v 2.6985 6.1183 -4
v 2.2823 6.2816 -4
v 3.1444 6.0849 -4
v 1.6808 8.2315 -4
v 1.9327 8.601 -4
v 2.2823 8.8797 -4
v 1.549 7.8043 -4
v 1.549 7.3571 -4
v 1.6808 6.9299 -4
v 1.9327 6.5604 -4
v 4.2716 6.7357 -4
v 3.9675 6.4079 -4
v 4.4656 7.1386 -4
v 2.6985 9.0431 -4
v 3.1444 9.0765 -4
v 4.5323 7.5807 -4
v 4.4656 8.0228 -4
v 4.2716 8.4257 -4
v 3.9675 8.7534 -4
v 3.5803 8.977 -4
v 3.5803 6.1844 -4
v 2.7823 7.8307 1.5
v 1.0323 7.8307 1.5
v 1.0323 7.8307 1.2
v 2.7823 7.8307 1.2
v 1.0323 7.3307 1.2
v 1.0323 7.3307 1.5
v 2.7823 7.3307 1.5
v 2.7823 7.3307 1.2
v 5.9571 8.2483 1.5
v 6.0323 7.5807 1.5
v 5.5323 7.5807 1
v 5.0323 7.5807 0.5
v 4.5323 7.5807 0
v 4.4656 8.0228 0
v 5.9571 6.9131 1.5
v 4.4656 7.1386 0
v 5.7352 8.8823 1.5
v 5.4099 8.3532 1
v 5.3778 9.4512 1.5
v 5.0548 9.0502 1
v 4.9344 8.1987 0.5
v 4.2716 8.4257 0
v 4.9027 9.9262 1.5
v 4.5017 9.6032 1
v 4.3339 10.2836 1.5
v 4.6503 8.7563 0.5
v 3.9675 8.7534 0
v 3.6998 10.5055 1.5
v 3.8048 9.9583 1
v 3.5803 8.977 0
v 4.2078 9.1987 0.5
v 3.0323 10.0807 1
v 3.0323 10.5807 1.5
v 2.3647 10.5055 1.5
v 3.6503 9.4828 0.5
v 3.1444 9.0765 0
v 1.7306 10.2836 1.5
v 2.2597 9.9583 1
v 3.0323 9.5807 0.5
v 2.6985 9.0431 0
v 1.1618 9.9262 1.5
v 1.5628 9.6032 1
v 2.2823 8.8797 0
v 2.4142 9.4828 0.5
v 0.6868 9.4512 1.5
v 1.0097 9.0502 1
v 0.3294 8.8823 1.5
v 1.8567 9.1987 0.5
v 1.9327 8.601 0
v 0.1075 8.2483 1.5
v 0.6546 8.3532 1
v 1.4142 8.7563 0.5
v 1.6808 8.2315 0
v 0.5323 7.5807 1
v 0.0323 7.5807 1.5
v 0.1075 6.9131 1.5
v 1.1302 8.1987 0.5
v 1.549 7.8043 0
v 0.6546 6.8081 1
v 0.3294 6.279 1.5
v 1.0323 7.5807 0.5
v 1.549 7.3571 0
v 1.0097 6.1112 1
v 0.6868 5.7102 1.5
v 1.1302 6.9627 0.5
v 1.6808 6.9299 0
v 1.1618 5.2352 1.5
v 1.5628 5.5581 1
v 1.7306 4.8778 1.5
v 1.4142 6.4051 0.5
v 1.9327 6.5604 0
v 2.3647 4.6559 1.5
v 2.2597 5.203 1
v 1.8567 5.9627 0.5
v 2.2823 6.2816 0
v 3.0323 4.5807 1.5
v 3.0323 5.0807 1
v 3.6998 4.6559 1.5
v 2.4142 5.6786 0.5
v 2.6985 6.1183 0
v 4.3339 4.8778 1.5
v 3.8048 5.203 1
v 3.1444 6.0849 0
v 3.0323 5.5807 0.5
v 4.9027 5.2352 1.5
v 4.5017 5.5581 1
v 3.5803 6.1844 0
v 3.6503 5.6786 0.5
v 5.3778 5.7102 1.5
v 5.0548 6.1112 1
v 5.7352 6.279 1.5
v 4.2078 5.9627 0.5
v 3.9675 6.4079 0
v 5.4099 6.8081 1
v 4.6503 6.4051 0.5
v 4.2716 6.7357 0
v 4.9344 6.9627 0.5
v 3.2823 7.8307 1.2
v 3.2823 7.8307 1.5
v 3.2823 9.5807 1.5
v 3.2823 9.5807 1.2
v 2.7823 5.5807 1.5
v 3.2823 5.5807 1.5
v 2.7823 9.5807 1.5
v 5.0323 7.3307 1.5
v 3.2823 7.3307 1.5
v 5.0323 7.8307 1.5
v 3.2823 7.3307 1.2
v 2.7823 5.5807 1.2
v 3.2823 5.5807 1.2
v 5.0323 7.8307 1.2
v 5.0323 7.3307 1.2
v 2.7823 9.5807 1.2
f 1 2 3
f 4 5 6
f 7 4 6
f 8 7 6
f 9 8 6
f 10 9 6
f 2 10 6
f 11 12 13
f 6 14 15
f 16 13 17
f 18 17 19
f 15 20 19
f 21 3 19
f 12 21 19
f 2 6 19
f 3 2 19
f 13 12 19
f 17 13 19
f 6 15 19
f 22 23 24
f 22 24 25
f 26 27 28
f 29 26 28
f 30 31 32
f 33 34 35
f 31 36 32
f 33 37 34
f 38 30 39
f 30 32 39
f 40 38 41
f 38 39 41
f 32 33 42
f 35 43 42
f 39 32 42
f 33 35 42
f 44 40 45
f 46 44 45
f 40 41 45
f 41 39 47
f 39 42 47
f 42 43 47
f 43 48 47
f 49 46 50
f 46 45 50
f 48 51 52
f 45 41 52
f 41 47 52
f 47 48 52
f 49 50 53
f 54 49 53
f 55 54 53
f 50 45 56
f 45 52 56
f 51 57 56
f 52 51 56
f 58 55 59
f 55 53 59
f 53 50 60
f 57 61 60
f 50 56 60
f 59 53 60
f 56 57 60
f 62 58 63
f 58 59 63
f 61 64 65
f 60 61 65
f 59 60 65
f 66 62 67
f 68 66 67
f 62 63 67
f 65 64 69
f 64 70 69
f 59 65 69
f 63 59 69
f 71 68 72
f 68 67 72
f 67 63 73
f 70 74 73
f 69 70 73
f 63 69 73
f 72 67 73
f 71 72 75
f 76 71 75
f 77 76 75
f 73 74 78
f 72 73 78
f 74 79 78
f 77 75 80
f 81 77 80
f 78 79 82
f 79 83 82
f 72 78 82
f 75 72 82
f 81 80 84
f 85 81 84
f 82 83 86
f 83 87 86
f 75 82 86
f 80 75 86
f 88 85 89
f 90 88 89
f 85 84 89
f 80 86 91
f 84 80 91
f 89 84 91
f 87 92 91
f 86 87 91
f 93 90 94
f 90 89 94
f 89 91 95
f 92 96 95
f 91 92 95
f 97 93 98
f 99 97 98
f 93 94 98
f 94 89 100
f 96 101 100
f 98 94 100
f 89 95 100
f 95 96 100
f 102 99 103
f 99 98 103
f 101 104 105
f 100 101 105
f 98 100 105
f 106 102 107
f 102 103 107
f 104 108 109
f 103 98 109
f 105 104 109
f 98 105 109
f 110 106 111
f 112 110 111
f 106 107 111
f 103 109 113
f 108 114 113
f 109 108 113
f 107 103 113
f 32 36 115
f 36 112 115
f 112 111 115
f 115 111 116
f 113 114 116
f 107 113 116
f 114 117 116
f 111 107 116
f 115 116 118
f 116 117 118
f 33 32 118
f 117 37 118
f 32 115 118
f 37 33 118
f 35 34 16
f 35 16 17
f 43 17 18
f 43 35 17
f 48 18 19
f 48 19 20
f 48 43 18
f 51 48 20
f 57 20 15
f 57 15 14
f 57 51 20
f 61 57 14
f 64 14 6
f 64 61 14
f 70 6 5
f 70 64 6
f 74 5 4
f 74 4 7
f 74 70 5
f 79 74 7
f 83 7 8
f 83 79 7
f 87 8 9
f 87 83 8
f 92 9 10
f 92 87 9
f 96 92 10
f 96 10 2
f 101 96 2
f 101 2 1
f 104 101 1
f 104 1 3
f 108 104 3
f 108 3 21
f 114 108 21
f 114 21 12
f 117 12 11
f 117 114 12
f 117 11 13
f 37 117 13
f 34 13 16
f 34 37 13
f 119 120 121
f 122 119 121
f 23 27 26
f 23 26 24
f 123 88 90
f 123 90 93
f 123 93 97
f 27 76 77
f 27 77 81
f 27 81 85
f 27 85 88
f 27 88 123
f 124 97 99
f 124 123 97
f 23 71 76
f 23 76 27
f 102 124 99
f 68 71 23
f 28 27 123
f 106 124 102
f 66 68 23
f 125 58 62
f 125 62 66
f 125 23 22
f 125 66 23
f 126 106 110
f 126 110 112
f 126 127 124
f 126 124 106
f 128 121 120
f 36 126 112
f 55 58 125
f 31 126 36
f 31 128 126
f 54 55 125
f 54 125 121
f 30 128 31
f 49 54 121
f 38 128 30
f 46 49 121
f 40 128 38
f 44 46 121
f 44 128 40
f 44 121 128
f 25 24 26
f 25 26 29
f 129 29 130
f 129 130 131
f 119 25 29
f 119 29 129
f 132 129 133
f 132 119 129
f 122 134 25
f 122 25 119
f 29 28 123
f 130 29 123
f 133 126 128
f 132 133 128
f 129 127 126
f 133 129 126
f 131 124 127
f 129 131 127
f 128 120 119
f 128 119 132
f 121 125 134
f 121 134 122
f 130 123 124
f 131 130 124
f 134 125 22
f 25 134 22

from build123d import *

# Parameters (mm, degrees)
F0_R     = 3
F1_DEPTH = 1.5
F2_SIZE  = 1.49999
F3_W     = 0.5
F3_H     = 1.75
F3_H_2   = 0.5
F3_W_2   = 1.75
F4_DEPTH = 0.3
F5_DEPTH = 4


# Not quite as in the source:
# - a fillet or chamfer is up to 0.001 mm smaller than in the source, because OpenCascade refuses the exact size


with BuildPart() as f1:
    # F0 (on Top) → F1 (new body)
    with BuildSketch(Plane.XY):
        with Locations((3.0322743114, 7.5806910172)):
            Circle(F0_R)
    extrude(amount=F1_DEPTH)

    # F2 (size 1.5 in the source; OpenCascade refuses exactly that, so slightly less here)
    f2_edges = [f1.edges().sort_by_distance(p)[0] for p in [
        (0.032274, 7.580691, 0),
    ]]
    chamfer(f2_edges, length=F2_SIZE)

    # F3 (on face) → F4 (cut)
    with BuildSketch(Plane.XY.offset(1.5)):
        with Locations((3.0322743114, 8.7056910172)):
            Rectangle(F3_W, F3_H)
        with Locations((3.0322743114, 7.5806910172)):
            Rectangle(F3_W, F3_H_2)
        with Locations((1.9072743114, 7.5806910172)):
            Rectangle(F3_W_2, F3_H_2)
        with Locations((4.1572743114, 7.5806910172)):
            Rectangle(F3_W_2, F3_H_2)
        Polygon((3.2822743114, 7.3306910172), (2.7822743114, 7.3306910172), (2.7822743114, 5.5806910172), (3.0322743114, 5.5806910172), (3.2822743114, 5.5806910172), align=None)
    extrude(amount=-F4_DEPTH, mode=Mode.SUBTRACT)

    # F5 (add): a face of the model
    f5_faces = [f1.faces().sort_by_distance(p)[0] for p in [
        (3.0322743114, 7.5806910172, 0),
    ]]
    extrude(f5_faces, amount=F5_DEPTH)


solid = f1.part
